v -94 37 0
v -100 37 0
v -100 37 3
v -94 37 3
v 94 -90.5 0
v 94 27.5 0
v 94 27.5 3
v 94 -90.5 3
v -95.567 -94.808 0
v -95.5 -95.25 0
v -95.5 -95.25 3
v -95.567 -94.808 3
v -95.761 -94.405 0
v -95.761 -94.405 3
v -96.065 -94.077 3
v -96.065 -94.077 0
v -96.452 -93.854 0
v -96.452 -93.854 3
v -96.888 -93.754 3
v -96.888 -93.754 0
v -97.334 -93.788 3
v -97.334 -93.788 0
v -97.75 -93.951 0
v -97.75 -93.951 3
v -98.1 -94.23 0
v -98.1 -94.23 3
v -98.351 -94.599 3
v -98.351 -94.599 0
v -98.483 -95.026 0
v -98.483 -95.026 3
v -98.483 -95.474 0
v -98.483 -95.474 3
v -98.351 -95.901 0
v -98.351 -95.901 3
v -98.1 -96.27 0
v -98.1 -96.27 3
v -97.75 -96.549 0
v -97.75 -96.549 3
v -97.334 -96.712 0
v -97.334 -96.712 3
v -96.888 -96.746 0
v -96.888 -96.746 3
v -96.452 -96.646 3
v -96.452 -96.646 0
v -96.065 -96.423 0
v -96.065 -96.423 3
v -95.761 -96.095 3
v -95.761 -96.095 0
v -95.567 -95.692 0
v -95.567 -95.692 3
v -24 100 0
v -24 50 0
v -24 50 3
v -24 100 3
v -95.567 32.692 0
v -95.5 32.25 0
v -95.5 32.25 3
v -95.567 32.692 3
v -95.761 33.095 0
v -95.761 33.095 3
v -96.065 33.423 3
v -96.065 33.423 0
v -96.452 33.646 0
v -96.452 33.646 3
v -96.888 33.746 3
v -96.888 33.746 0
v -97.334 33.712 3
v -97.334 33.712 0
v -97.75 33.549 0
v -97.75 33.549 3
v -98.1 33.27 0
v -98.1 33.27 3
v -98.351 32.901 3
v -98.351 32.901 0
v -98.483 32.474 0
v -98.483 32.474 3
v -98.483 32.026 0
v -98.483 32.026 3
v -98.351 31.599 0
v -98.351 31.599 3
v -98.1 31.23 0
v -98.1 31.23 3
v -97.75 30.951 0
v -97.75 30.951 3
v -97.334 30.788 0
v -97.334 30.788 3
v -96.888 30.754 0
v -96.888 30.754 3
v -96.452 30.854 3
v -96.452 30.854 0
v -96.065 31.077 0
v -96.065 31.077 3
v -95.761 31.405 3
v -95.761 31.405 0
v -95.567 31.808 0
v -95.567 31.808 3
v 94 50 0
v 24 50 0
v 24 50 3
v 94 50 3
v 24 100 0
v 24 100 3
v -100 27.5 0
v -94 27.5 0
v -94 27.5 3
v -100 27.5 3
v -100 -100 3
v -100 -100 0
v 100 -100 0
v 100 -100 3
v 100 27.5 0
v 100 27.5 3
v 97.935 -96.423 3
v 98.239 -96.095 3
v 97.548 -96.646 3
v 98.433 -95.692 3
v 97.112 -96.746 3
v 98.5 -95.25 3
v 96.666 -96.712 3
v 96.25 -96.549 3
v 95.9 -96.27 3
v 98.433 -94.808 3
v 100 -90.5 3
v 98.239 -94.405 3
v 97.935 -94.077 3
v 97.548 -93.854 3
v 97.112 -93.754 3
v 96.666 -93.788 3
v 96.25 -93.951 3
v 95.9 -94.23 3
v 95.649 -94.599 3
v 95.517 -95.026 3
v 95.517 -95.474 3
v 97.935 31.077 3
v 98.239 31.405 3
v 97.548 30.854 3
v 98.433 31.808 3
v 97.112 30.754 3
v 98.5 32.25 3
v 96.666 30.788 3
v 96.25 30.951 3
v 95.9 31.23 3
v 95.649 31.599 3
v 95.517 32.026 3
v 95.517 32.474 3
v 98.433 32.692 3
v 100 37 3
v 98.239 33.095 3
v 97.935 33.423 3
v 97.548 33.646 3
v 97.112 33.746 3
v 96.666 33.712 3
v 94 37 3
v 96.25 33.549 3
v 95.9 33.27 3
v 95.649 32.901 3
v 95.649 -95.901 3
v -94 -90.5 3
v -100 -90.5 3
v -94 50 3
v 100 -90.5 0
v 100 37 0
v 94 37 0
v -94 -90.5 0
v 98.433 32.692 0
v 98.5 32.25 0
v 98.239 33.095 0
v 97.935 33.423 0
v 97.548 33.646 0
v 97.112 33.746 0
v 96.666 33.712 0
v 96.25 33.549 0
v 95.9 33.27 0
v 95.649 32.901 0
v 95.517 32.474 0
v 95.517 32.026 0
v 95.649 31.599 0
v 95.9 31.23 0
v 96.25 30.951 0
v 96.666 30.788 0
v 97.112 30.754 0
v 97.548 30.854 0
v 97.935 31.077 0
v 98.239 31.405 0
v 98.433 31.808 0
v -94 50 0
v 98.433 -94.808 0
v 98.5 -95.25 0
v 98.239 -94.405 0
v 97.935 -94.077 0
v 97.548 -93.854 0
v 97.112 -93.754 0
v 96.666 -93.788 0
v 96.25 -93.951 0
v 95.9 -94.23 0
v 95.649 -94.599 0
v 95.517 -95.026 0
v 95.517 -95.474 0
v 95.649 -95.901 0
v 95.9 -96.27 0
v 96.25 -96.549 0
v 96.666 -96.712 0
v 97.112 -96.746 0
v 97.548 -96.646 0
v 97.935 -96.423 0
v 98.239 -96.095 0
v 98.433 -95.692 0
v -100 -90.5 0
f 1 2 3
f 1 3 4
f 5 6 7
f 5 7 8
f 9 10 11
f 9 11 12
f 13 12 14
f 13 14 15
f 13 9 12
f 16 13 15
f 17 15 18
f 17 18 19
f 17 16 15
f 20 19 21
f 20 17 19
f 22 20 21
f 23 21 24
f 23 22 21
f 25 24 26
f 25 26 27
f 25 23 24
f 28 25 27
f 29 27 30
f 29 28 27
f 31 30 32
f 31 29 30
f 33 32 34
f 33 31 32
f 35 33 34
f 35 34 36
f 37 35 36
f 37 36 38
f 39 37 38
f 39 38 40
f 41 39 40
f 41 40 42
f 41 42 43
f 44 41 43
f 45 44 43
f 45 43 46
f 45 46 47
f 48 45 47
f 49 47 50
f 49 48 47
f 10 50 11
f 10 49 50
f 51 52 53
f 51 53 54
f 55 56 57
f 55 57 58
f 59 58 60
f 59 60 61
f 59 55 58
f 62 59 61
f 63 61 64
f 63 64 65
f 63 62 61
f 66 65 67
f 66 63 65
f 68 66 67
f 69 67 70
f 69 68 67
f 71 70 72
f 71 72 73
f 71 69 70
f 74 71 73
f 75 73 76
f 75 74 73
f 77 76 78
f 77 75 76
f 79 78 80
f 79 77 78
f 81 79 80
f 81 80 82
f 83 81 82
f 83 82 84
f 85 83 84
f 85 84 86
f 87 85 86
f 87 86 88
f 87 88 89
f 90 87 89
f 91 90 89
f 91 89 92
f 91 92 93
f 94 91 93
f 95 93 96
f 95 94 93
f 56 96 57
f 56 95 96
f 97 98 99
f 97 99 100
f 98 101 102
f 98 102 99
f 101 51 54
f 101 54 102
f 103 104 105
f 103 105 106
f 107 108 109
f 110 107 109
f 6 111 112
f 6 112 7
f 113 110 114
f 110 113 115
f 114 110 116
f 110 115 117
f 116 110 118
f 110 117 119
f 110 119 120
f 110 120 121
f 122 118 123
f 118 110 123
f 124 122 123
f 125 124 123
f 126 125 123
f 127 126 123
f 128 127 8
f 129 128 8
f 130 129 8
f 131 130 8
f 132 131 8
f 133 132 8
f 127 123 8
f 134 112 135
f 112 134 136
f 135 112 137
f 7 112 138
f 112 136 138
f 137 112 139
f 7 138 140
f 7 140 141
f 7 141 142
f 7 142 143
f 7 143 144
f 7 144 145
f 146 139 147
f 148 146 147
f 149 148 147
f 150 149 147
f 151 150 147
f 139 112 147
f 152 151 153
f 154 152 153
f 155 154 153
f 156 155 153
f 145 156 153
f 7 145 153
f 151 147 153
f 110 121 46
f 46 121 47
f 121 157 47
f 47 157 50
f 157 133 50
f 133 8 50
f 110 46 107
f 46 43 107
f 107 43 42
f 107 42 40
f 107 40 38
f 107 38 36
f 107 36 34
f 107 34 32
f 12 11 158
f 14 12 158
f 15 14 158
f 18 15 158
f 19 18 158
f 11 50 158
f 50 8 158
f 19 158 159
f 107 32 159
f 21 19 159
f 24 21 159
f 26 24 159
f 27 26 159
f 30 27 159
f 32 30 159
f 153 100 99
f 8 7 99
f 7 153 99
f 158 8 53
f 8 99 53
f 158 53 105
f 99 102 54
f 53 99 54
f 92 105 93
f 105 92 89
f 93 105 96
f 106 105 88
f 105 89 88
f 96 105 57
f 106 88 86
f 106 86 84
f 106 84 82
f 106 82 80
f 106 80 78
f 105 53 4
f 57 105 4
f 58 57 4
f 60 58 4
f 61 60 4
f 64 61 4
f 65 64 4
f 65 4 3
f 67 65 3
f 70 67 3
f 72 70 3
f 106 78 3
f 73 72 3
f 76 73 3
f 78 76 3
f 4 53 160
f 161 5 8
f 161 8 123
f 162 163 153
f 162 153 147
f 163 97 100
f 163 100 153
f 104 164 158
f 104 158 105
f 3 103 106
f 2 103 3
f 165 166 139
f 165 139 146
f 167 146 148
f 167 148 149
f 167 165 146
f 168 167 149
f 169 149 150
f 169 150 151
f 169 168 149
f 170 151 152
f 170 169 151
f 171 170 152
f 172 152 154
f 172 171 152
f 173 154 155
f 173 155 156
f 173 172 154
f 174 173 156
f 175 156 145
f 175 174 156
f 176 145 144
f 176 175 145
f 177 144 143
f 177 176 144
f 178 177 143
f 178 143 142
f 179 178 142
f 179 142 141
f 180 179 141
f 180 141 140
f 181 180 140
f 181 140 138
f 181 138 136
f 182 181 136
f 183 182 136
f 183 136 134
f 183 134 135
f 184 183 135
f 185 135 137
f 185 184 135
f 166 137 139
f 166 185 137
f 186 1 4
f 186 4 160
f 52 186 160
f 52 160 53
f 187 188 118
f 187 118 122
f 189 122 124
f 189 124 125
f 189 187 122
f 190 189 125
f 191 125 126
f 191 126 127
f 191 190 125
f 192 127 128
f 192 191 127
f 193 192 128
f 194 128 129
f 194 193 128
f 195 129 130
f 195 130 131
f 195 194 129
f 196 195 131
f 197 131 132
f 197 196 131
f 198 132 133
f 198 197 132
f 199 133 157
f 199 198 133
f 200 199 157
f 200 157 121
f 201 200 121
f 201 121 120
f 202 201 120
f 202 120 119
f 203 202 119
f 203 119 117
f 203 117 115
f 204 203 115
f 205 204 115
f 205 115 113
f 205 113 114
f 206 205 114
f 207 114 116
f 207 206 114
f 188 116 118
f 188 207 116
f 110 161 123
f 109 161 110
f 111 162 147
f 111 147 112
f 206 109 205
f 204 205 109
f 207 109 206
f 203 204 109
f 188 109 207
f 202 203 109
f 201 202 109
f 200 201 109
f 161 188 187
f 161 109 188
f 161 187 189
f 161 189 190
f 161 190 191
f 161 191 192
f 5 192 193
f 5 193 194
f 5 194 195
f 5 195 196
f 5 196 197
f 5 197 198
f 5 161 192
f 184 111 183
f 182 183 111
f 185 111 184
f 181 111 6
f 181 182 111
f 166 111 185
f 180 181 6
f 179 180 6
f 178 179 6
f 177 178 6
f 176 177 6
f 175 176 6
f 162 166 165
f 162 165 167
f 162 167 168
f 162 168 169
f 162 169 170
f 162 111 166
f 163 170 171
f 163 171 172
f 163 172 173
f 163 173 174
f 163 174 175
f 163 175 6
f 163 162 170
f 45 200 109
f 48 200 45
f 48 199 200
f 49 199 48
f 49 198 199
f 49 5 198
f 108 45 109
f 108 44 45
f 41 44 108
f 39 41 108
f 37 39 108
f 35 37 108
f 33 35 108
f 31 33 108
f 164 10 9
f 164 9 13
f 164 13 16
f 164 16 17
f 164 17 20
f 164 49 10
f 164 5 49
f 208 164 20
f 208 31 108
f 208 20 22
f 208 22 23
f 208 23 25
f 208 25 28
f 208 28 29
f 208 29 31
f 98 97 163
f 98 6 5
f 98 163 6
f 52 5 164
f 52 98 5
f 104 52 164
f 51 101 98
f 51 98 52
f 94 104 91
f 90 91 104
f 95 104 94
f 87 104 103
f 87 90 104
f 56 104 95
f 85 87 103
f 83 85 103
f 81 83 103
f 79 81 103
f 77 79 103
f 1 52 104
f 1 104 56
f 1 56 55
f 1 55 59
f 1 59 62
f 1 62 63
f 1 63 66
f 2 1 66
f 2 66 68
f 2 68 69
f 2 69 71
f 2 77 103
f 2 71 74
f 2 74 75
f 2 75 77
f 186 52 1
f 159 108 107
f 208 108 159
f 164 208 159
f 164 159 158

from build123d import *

# Parameters (mm, degrees)
ESBO_O1_R                = 1.5
RESSALTO_EXTRUS_O1_DEPTH = 3


with BuildPart() as part:
    # Esboço1 → Ressalto-extrusão1 (new body)
    with BuildSketch(Plane.XY):
        Polygon((-24, 100), (24, 100), (24, 50), (94, 50), (94, 37), (100, 37), (100, 27.5), (94, 27.5), (94, -90.5), (100, -90.5), (100, -100), (94, -100), (-94, -100), (-100, -100), (-100, -90.5), (-94, -90.5), (-94, 27.5), (-100, 27.5), (-100, 37), (-94, 37), (-94, 50), (-24, 50), align=None)
        with Locations((97, -95.25)):
            Circle(ESBO_O1_R, mode=Mode.SUBTRACT)
        with Locations((97, 32.25)):
            Circle(ESBO_O1_R, mode=Mode.SUBTRACT)
        with Locations((-97, 32.25)):
            Circle(ESBO_O1_R, mode=Mode.SUBTRACT)
        with Locations((-97, -95.25)):
            Circle(ESBO_O1_R, mode=Mode.SUBTRACT)
    extrude(amount=RESSALTO_EXTRUS_O1_DEPTH)


solid = part.part
